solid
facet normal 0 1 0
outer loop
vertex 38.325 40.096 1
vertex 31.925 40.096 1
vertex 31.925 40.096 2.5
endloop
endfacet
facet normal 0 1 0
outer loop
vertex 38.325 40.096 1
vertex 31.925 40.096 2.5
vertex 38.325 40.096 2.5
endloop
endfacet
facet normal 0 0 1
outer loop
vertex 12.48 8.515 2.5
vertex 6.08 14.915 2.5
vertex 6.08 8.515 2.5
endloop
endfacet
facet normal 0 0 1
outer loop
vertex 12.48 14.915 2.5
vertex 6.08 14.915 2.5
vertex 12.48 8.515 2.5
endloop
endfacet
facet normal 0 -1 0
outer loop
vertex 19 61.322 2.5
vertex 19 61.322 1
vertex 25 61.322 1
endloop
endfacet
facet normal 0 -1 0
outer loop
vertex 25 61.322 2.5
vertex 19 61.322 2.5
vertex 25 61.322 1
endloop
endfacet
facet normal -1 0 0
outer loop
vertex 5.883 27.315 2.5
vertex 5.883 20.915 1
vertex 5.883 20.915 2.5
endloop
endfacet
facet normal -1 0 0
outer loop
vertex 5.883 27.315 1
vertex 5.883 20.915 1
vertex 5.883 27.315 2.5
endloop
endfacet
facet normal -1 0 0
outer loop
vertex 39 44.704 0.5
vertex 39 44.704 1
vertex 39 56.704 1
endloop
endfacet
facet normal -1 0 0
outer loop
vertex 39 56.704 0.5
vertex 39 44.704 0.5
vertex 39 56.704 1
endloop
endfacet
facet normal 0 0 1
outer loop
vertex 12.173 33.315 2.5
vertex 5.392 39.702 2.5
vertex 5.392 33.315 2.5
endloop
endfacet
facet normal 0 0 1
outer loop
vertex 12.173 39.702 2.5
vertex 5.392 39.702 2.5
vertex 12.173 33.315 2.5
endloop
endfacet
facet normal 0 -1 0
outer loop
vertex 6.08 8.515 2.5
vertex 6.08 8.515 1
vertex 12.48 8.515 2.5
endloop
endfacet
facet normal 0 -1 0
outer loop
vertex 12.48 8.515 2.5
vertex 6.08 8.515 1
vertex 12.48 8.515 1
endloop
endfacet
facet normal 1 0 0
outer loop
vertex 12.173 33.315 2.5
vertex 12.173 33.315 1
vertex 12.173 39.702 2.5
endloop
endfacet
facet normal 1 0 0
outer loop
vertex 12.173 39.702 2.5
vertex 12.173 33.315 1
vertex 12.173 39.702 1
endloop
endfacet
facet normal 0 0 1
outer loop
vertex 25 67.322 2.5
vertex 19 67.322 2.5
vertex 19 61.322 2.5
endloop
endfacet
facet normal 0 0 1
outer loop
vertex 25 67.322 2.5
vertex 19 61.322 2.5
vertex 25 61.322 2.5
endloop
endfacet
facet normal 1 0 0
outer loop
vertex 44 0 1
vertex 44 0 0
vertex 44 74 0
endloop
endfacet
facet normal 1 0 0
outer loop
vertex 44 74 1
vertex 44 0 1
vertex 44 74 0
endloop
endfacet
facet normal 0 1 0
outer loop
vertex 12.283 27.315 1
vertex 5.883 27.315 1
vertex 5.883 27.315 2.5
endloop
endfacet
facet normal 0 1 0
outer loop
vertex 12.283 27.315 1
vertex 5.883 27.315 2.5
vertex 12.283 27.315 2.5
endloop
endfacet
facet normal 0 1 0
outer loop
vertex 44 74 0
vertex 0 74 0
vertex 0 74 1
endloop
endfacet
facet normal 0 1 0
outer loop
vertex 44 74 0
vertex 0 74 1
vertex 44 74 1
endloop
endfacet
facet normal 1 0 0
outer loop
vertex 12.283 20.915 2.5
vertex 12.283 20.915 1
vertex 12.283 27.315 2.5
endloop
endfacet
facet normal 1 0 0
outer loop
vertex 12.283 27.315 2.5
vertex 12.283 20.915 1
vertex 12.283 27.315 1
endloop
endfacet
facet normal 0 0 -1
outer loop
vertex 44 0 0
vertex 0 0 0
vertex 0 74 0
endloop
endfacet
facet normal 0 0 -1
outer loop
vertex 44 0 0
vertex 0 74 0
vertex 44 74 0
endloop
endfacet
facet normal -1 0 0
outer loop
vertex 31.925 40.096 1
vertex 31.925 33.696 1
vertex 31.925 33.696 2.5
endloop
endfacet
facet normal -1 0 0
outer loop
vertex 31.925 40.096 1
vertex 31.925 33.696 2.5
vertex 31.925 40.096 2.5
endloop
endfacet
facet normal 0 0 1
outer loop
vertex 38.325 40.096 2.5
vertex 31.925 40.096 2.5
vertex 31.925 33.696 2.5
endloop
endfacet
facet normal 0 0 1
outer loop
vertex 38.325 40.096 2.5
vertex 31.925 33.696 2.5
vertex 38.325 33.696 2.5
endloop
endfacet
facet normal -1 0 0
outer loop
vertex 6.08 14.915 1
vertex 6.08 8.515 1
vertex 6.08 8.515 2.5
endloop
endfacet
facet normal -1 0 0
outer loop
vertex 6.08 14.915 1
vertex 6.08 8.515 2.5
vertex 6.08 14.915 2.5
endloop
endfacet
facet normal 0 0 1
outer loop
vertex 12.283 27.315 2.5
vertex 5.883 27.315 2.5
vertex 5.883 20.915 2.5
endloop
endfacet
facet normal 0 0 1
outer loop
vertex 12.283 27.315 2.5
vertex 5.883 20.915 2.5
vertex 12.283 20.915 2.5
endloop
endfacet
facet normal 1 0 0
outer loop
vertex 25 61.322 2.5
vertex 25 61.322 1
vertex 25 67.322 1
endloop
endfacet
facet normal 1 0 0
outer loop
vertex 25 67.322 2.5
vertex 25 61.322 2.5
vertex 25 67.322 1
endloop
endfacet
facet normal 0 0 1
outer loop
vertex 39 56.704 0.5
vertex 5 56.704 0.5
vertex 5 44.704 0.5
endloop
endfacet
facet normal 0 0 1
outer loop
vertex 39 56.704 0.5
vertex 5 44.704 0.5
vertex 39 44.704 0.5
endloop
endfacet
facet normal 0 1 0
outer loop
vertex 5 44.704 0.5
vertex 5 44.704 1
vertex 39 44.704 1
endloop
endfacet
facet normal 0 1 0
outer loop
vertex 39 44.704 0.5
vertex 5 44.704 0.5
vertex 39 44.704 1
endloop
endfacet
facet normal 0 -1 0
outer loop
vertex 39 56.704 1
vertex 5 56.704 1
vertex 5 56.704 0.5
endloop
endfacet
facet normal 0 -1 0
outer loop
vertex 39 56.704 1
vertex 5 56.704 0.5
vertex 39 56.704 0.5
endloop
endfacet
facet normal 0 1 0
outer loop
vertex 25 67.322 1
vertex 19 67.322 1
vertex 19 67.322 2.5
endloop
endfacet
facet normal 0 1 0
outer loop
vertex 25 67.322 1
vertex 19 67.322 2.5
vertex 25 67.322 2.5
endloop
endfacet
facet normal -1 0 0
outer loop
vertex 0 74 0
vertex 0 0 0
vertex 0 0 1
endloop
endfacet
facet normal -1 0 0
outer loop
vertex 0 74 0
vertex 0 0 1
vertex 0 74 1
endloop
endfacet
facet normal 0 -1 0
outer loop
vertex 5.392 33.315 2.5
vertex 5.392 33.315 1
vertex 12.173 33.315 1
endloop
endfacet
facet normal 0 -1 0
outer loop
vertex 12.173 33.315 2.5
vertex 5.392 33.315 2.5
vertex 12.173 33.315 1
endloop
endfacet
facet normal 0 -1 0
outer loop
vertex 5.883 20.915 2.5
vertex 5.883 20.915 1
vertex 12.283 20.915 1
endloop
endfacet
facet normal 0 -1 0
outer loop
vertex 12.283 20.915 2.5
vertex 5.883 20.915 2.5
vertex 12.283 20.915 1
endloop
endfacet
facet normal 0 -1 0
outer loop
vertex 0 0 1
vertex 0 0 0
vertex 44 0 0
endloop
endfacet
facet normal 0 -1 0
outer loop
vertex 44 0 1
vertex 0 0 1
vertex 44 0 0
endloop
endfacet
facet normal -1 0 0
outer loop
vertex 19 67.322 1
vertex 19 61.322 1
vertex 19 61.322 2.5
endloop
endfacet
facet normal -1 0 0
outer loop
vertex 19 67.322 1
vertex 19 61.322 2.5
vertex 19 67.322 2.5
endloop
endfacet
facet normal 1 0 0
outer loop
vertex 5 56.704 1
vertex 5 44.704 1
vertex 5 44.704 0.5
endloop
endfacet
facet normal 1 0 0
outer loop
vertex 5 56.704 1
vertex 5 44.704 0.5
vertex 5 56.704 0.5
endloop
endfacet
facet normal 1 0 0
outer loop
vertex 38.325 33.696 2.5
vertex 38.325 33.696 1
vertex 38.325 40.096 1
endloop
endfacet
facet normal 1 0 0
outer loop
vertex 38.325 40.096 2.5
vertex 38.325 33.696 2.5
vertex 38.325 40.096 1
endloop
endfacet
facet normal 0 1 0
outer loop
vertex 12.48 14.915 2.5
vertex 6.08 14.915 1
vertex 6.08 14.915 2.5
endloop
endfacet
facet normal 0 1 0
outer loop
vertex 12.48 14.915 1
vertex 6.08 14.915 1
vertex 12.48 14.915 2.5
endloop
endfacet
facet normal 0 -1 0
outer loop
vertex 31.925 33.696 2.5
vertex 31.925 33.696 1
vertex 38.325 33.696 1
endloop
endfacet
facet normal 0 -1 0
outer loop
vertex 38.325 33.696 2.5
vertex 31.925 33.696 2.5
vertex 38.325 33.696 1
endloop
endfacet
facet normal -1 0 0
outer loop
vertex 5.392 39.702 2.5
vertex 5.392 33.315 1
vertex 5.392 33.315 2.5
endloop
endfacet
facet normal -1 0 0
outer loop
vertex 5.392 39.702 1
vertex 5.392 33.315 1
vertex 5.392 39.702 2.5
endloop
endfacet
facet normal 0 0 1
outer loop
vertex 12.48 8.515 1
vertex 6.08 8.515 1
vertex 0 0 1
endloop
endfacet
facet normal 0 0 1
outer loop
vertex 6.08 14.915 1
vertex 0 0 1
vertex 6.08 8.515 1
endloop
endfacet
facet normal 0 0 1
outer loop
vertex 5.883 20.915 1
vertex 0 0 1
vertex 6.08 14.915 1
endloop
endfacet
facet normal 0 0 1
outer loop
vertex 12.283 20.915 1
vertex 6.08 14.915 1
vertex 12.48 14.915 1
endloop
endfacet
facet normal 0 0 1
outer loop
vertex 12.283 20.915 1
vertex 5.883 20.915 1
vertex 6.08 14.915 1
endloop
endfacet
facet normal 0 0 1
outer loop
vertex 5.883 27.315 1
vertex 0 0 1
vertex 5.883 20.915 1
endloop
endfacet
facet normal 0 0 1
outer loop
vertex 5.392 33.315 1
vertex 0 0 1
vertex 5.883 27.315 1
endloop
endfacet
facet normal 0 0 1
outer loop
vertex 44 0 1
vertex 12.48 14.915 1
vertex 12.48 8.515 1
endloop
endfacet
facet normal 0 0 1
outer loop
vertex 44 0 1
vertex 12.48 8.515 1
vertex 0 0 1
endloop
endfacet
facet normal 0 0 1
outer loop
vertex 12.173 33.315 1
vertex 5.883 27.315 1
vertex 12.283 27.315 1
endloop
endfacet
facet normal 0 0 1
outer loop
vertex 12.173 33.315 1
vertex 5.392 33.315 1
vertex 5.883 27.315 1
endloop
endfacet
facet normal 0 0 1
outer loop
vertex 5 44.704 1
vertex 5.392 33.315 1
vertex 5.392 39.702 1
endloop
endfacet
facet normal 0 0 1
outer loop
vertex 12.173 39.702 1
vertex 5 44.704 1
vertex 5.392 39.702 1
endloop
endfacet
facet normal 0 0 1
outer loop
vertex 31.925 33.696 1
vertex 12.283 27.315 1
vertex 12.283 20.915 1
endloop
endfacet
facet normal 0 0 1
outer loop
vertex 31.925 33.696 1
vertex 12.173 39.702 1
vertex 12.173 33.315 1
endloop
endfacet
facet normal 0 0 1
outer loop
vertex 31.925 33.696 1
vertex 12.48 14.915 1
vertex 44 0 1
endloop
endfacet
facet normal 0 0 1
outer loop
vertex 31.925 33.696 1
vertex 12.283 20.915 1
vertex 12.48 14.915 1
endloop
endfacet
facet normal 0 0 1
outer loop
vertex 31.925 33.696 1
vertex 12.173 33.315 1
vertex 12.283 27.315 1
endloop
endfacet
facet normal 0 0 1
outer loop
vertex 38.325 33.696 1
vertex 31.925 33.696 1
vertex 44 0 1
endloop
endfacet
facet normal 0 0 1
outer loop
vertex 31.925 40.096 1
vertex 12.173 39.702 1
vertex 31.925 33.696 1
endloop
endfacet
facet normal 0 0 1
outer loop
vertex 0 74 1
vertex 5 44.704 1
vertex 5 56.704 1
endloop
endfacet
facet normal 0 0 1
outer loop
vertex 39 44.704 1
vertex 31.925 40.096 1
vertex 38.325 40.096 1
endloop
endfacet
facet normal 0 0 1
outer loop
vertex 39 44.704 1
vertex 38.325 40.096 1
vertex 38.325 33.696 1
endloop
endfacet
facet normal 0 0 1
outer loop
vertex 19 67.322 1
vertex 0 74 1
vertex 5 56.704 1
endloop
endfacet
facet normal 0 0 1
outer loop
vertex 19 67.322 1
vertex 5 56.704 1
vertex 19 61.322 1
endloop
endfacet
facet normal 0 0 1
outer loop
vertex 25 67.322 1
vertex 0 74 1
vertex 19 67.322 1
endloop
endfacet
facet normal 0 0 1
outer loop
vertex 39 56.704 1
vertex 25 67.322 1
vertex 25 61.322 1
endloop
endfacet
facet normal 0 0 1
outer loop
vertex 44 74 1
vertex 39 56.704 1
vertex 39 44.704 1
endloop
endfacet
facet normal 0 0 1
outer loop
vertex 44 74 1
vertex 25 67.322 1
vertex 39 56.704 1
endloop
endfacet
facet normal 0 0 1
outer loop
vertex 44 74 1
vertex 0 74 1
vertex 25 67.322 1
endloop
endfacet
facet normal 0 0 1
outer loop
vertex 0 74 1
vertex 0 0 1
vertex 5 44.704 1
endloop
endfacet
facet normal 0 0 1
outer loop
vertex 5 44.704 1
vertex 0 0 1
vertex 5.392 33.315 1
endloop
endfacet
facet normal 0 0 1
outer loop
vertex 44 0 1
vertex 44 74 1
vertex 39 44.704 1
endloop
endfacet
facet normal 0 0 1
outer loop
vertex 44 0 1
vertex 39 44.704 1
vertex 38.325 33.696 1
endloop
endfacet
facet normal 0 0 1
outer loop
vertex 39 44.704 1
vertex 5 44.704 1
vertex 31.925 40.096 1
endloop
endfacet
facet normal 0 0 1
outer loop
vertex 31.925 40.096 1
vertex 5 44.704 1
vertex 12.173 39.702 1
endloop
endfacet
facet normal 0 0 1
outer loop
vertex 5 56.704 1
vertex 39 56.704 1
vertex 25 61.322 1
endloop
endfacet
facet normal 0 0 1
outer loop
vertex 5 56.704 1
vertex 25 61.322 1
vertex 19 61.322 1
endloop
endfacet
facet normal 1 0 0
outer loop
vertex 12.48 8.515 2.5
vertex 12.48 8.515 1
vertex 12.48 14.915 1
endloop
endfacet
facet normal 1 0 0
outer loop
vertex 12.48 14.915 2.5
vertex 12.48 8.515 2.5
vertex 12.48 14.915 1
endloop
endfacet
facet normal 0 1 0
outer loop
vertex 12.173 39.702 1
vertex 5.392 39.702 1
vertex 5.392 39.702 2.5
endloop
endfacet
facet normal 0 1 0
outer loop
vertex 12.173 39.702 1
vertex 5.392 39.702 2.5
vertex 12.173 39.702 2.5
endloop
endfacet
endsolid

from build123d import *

# Parameters (mm, degrees)
SKETCH1_W           = 44
SKETCH1_H           = 74
BOSS_EXTRUDE1_DEPTH = 1
SKETCH2_W           = 34
SKETCH2_H           = 12
CUT_EXTRUDE1_DEPTH  = 0.5
SKETCH3_W           = 6
SKETCH3_H           = 6
BOSS_EXTRUDE2_DEPTH = 1.5
SKETCH5_W           = 6.780779409
SKETCH5_H           = 6.387690747
BOSS_EXTRUDE5_DEPTH = 1.5
SKETCH7_W           = 6.4
SKETCH7_H           = 6.4
BOSS_EXTRUDE6_DEPTH = 1.5
SKETCH8_W           = 6.4
SKETCH8_H           = 6.4
BOSS_EXTRUDE7_DEPTH = 1.5
SKETCH9_W           = 6.4
SKETCH9_H           = 6.4
BOSS_EXTRUDE8_DEPTH = 1.5


with BuildPart() as part:
    # Sketch1 → Boss-Extrude1 (new body)
    with BuildSketch(Plane.XY):
        with Locations((22, 37)):
            Rectangle(SKETCH1_W, SKETCH1_H)
    extrude(amount=BOSS_EXTRUDE1_DEPTH)

    # Sketch2 → Cut-Extrude1 (cut)
    with BuildSketch(Plane.XY.offset(1)):
        with Locations((22, 50.703569151)):
            Rectangle(SKETCH2_W, SKETCH2_H)
    extrude(amount=-CUT_EXTRUDE1_DEPTH, mode=Mode.SUBTRACT)

    # Sketch3 → Boss-Extrude2 (add)
    with BuildSketch(Plane.XY.offset(1)):
        with Locations((22, 64.322360922)):
            Rectangle(SKETCH3_W, SKETCH3_H)
    extrude(amount=BOSS_EXTRUDE2_DEPTH)

    # Sketch5 → Boss-Extrude5 (add)
    with BuildSketch(Plane.XY.offset(1)):
        with Locations((8.782393761, 36.508639174)):
            Rectangle(SKETCH5_W, SKETCH5_H)
    extrude(amount=BOSS_EXTRUDE5_DEPTH)

    # Sketch7 → Boss-Extrude6 (add)
    with BuildSketch(Plane.XY.offset(1)):
        with Locations((9.083364884, 24.1147938)):
            Rectangle(SKETCH7_W, SKETCH7_H)
    extrude(amount=BOSS_EXTRUDE6_DEPTH)

    # Sketch8 → Boss-Extrude7 (add)
    with BuildSketch(Plane.XY.offset(1)):
        with Locations((9.279909214, 11.7147938)):
            Rectangle(SKETCH8_W, SKETCH8_H)
    extrude(amount=BOSS_EXTRUDE7_DEPTH)

    # Sketch9 → Boss-Extrude8 (add)
    with BuildSketch(Plane.XY.offset(1)):
        with Locations((35.1254887, 36.895573208)):
            Rectangle(SKETCH9_W, SKETCH9_H)
    extrude(amount=BOSS_EXTRUDE8_DEPTH)


solid = part.part
